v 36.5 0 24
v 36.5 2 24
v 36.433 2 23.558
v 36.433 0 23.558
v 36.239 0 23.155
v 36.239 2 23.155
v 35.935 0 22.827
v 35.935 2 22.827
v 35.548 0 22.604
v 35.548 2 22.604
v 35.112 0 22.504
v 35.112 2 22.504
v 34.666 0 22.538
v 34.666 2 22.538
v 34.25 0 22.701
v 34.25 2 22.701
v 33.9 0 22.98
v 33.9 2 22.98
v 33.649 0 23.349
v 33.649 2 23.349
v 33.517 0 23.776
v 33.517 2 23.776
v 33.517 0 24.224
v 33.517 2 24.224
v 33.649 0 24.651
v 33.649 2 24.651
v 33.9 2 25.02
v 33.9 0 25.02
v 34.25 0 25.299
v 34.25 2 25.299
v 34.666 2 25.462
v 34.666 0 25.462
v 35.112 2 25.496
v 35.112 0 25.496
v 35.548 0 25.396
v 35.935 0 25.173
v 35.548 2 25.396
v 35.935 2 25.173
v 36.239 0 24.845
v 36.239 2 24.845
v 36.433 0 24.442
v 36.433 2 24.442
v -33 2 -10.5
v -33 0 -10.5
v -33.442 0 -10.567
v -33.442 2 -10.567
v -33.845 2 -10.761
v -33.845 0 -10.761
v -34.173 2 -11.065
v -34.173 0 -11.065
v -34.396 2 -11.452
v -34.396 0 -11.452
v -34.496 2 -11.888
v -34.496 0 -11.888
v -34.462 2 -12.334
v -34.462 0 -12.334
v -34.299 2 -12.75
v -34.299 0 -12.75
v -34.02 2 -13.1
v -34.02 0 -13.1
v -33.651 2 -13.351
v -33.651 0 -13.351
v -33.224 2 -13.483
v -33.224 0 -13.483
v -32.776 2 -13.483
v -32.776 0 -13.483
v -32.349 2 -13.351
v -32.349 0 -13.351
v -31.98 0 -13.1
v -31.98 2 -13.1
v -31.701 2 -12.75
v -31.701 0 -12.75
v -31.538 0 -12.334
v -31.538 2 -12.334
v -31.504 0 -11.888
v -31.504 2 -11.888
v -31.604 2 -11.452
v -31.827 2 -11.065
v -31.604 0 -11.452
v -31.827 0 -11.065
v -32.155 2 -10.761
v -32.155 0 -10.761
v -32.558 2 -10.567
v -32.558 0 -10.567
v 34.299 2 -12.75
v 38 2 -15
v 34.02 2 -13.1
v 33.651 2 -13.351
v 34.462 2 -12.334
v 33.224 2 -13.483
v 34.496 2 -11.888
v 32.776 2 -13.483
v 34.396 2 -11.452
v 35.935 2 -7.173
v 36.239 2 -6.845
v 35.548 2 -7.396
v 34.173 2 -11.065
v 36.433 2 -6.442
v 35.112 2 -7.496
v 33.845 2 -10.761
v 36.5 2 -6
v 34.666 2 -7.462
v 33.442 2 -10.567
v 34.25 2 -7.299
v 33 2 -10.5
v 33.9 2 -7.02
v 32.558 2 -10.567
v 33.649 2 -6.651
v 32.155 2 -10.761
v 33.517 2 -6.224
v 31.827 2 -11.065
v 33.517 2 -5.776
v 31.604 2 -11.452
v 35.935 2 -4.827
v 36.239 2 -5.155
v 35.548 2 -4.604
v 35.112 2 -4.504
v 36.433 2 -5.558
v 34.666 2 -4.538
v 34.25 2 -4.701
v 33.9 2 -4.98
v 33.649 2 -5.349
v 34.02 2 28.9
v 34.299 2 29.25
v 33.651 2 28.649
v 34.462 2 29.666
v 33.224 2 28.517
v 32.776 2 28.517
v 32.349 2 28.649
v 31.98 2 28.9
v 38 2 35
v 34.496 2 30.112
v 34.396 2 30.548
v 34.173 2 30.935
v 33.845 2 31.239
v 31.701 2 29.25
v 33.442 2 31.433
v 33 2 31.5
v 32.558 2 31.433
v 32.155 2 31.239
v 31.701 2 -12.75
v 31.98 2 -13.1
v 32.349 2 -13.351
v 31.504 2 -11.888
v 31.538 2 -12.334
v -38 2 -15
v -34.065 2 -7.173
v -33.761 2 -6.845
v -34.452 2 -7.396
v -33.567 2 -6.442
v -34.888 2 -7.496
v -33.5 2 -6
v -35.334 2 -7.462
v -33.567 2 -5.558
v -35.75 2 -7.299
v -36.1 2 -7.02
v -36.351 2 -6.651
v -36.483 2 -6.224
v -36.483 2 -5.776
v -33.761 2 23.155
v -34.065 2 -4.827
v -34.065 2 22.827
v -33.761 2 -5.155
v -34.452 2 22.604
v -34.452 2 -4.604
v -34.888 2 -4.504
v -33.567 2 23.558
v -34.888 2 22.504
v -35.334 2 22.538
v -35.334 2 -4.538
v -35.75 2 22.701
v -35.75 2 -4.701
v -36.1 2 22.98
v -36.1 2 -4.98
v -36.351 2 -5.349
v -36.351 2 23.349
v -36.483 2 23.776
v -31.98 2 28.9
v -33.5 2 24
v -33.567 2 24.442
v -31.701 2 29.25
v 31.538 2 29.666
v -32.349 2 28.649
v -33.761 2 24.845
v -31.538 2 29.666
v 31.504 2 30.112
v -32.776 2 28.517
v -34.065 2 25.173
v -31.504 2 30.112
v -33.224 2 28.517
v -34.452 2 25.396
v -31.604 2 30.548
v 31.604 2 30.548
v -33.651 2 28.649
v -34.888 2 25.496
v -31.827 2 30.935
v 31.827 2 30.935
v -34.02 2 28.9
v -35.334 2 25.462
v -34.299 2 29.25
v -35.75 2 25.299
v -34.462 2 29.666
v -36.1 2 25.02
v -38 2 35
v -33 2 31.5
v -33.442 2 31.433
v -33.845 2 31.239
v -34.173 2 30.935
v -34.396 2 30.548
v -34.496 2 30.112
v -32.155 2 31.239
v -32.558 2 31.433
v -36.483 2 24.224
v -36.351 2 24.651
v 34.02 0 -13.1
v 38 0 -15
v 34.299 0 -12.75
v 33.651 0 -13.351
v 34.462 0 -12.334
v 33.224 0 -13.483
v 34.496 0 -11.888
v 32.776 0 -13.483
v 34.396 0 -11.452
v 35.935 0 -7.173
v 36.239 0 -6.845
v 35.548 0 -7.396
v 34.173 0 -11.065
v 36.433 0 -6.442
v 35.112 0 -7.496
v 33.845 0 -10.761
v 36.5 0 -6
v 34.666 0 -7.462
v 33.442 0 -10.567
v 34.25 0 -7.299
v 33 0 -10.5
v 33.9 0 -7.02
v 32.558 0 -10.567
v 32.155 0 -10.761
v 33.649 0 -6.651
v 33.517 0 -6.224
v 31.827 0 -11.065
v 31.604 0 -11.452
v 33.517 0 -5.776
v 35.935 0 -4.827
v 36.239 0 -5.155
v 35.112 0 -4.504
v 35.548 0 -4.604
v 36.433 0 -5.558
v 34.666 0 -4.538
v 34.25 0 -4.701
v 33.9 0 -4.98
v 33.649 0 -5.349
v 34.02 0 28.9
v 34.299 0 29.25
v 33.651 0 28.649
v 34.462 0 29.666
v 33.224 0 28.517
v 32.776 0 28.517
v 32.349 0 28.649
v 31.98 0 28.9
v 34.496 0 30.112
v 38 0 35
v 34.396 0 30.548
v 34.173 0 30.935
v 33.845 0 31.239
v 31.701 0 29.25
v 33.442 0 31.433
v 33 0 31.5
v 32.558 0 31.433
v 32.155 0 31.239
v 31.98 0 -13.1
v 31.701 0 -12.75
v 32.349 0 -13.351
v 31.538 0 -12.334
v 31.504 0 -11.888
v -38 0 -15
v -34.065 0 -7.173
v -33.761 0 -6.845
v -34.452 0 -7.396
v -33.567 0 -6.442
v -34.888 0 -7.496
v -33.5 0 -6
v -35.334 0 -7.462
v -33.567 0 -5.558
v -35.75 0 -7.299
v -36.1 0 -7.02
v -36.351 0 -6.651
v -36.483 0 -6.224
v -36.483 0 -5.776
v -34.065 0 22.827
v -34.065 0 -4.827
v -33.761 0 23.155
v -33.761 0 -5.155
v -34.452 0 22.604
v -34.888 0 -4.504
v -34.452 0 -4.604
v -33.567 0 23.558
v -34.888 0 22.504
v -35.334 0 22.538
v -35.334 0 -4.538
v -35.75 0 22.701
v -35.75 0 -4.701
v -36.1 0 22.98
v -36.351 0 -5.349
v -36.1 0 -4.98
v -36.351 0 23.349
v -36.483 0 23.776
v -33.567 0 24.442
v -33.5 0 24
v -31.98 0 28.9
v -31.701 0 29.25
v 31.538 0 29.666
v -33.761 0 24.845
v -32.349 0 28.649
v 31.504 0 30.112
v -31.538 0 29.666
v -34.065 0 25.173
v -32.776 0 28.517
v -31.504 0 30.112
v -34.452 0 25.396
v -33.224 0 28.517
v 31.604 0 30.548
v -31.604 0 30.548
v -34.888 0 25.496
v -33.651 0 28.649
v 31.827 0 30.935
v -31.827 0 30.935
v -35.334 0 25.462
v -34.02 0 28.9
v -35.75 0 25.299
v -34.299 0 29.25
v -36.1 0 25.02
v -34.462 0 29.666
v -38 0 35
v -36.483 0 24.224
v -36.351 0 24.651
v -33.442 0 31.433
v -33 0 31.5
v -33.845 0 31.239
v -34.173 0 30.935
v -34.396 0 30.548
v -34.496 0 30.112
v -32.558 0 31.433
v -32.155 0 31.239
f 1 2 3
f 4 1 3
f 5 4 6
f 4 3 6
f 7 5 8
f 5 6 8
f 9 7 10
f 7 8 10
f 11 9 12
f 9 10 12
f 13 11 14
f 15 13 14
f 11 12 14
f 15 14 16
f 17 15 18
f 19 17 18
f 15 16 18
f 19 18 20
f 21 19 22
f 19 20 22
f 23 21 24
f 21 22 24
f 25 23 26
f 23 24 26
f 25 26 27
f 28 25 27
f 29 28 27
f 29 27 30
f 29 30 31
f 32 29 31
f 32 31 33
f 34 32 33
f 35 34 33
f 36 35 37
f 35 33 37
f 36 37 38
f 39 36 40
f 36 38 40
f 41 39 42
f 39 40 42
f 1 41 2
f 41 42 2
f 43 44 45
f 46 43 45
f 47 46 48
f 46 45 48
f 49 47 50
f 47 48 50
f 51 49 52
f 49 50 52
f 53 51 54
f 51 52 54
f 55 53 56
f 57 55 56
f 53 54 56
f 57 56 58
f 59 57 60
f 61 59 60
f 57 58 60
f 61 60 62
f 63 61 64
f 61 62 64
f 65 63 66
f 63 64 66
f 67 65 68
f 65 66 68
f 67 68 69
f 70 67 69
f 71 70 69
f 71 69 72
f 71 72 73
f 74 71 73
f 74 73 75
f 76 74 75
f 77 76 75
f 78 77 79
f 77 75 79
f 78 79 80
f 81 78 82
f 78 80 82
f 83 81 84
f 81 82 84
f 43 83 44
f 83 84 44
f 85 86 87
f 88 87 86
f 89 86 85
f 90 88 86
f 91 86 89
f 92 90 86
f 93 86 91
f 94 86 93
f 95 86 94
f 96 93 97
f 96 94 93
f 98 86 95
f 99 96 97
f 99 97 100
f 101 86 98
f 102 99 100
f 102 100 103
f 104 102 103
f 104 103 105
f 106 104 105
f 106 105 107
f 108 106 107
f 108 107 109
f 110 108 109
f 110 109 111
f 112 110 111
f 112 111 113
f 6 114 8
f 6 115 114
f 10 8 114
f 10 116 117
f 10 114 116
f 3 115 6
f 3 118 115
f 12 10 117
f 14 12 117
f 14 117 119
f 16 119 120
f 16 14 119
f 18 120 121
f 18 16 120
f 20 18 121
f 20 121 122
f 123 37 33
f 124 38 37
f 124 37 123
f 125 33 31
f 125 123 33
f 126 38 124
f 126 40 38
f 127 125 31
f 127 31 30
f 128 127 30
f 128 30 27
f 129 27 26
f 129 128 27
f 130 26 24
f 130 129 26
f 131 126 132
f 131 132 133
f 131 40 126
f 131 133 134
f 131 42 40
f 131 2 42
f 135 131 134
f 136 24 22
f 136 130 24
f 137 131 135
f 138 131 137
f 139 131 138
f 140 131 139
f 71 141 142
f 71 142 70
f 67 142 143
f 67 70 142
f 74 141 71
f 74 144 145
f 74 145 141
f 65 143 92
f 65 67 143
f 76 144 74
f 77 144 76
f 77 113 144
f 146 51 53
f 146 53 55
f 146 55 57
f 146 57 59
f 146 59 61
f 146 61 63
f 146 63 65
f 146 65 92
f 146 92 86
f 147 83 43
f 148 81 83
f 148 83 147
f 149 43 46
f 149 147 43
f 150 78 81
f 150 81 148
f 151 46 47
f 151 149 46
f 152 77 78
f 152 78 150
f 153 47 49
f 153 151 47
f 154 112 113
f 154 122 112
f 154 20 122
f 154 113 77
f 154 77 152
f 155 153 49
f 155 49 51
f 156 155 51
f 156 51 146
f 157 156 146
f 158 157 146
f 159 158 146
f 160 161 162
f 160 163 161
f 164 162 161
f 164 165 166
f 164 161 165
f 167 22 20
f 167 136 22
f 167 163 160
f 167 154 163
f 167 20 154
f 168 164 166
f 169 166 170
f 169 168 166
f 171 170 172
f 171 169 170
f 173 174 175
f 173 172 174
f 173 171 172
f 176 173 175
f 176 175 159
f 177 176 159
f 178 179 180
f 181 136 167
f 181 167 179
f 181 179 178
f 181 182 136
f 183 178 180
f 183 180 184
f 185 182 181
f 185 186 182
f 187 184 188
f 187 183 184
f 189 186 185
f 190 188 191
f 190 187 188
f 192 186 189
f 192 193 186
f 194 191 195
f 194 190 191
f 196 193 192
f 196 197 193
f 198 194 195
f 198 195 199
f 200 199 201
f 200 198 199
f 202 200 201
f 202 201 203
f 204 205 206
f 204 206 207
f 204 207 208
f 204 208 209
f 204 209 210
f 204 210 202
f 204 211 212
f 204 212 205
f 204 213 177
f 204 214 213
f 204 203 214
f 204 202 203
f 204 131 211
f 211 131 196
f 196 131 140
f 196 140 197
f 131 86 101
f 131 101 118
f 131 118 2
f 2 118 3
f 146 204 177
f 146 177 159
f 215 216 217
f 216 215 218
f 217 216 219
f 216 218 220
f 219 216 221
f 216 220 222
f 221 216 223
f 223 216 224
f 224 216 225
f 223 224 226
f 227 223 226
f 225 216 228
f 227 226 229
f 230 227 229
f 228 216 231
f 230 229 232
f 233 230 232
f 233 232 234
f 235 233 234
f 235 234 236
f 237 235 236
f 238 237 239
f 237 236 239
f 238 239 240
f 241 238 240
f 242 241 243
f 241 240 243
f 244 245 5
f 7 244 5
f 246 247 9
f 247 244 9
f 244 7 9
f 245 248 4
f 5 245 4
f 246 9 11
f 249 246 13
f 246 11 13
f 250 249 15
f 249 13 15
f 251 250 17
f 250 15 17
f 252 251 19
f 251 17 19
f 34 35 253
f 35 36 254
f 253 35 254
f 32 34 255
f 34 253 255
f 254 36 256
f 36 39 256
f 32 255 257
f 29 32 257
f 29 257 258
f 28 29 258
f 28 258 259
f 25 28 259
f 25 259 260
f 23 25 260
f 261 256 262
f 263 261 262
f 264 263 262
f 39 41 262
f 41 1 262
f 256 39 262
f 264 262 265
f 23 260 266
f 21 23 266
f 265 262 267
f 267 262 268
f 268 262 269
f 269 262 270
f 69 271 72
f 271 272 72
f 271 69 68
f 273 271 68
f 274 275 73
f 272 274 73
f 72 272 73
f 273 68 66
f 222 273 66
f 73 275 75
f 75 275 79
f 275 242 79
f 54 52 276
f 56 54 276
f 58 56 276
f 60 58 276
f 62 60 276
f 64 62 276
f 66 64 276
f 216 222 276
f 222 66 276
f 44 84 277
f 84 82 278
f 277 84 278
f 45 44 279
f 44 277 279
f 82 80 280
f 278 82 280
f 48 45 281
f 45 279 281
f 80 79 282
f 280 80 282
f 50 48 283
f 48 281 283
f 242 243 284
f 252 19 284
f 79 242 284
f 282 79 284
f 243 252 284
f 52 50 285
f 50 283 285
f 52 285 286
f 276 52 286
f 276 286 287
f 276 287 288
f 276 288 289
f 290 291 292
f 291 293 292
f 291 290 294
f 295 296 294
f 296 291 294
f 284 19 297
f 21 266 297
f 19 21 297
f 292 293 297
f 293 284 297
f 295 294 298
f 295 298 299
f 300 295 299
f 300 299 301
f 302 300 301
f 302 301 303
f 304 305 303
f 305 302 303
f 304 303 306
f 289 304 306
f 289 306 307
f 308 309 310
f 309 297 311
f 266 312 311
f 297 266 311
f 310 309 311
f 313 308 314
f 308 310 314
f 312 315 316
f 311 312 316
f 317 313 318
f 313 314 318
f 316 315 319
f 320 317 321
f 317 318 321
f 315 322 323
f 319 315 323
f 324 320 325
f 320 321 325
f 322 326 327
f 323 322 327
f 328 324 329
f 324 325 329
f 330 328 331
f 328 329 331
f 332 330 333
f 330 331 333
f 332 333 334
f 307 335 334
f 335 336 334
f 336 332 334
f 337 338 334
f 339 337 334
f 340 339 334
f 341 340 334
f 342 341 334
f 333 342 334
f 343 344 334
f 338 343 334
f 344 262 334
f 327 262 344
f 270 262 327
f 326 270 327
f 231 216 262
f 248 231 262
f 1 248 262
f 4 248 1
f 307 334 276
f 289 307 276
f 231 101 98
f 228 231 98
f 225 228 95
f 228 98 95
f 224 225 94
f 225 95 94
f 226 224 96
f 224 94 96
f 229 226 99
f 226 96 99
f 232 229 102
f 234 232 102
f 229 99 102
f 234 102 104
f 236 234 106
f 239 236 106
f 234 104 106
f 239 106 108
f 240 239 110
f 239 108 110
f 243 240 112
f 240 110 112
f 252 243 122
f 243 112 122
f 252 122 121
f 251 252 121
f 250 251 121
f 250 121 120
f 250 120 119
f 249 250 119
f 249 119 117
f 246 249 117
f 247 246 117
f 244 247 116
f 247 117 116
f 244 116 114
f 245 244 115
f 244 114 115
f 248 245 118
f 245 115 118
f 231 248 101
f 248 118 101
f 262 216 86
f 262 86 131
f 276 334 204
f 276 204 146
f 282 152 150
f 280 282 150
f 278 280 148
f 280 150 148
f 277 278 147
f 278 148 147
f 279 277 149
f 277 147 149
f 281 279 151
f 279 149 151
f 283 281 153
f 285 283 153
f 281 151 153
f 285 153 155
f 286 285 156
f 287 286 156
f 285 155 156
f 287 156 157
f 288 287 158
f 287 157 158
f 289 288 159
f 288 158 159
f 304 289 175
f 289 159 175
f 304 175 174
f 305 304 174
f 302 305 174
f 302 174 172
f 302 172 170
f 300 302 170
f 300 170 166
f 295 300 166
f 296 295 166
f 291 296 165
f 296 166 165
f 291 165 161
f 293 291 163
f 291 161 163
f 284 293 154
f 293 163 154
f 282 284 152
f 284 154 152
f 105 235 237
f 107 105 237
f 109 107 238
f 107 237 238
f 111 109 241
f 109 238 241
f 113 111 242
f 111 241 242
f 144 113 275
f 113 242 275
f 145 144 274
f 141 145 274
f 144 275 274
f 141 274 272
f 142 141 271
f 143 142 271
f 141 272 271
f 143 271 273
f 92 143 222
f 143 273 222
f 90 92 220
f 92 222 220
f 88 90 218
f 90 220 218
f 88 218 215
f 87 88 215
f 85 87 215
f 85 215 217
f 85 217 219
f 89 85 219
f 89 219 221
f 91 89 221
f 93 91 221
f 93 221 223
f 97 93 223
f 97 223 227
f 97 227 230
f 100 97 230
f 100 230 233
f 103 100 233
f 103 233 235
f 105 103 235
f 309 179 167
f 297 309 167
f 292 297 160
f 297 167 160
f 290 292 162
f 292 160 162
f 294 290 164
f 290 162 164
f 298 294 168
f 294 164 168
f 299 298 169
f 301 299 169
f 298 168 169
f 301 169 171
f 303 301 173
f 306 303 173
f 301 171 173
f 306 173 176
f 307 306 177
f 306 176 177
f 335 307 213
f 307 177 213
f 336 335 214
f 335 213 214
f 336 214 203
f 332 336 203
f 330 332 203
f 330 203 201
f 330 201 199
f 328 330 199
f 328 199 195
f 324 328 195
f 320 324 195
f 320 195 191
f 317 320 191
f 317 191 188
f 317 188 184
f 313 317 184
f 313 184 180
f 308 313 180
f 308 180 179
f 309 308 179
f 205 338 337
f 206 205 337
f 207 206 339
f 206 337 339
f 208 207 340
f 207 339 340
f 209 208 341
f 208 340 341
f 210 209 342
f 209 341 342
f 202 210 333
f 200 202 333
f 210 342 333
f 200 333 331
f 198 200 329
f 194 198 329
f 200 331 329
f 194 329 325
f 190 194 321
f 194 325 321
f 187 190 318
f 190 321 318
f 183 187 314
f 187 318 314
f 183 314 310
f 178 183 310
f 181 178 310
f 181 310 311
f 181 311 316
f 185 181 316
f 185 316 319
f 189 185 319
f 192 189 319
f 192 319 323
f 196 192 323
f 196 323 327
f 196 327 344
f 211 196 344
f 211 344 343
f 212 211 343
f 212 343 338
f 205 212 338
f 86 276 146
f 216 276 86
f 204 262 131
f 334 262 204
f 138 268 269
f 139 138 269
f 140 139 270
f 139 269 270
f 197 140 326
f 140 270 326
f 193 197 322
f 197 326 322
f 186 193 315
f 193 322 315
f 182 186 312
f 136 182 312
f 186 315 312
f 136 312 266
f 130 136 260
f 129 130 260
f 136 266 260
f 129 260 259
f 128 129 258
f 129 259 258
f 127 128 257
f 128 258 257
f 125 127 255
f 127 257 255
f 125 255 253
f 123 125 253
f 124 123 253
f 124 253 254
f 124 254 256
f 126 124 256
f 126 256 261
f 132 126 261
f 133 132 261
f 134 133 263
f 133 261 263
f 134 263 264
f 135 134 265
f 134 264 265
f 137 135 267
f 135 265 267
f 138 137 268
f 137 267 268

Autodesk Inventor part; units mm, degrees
ref_plane "YZ Plane" through (0, 0, 0) normal (1, 0, 0) x (0, 1, 0)
ref_plane "XZ Plane" through (0, 0, 0) normal (0, 1, 0) x (-1, 0, 0)
ref_plane "XY Plane" through (0, 0, 0) normal (0, 0, 1) x (1, 0, 0)
sketch "スケッチ1" plane through (0, 0, 0) normal (0, 1, 0) x (-1, 0, 0)
  line L0 (-38, 35) -> (38, 35)
  line L1 (38, 35) -> (38, -15)
  line L2 (38, -15) -> (-38, -15)
  line L3 (-38, -15) -> (-38, 35)
  point P0 (0, 0)
  dimension "d0" = 76
  dimension "d3" = 50
  dimension "d4" = 35
  dimension "d5" = 38
extrude "押し出し1" add sketch "スケッチ1" along normal blind 2
sketch "スケッチ2" plane through (0, 2, 0) normal (0, 1, 0) x (1, 0, 0)
  line L0 (-38, -35) -> (38, -35) projected
  line L1 (38, -35) -> (38, 15) projected
  line L2 (38, 15) -> (-38, 15) projected
  line L3 (-38, 15) -> (-38, -35) projected
  circle A0 centre (-35, 6) radius 1.5
  circle A1 centre (-35, -24) radius 1.5
  circle A2 centre (35, -24) radius 1.5
  circle A3 centre (35, 6) radius 1.5
  point P0 (0, 0)
  dimension "d9" = 3
  dimension "d10" = 30
  dimension "d11" = 70
  dimension "d12" = 70
  dimension "d13" = 3
  dimension "d14" = 11
  dimension "d15" = 30
  dimension "d16" = 3
  dimension "d19" = 11
extrude "押し出し2" cut sketch "スケッチ2" against normal blind 2 keep common part
sketch "スケッチ3" plane through (0, 2, 0) normal (0, 1, 0) x (1, 0, 0)
  circle A0 centre (35, 6) radius 1.5 projected
  line L0 (-38, -35) -> (38, -35) projected
  line L1 (-38, 15) -> (-38, -35) projected
  circle A1 centre (-33, 12) radius 1.5
  circle A2 centre (-33, -30) radius 1.5
  circle A3 centre (33, -30) radius 1.5
  circle A4 centre (33, 12) radius 1.5
  point P0 (0, 0)
  dimension "d20" = 66
  dimension "d22" = 42
  dimension "d23" = 42
  dimension "d24" = 66
  dimension "d25" = 5
  dimension "d26" = 5
  dimension "d27" = 5
  dimension "d28" = 5
hole "穴1" at (-33, 2, 30) at (33, 2, 30) at (33, 2, -12) at (-33, 2, -12) direction (0, -1, 0) diameter 3 end through all
properties part number "circuit_plate"
